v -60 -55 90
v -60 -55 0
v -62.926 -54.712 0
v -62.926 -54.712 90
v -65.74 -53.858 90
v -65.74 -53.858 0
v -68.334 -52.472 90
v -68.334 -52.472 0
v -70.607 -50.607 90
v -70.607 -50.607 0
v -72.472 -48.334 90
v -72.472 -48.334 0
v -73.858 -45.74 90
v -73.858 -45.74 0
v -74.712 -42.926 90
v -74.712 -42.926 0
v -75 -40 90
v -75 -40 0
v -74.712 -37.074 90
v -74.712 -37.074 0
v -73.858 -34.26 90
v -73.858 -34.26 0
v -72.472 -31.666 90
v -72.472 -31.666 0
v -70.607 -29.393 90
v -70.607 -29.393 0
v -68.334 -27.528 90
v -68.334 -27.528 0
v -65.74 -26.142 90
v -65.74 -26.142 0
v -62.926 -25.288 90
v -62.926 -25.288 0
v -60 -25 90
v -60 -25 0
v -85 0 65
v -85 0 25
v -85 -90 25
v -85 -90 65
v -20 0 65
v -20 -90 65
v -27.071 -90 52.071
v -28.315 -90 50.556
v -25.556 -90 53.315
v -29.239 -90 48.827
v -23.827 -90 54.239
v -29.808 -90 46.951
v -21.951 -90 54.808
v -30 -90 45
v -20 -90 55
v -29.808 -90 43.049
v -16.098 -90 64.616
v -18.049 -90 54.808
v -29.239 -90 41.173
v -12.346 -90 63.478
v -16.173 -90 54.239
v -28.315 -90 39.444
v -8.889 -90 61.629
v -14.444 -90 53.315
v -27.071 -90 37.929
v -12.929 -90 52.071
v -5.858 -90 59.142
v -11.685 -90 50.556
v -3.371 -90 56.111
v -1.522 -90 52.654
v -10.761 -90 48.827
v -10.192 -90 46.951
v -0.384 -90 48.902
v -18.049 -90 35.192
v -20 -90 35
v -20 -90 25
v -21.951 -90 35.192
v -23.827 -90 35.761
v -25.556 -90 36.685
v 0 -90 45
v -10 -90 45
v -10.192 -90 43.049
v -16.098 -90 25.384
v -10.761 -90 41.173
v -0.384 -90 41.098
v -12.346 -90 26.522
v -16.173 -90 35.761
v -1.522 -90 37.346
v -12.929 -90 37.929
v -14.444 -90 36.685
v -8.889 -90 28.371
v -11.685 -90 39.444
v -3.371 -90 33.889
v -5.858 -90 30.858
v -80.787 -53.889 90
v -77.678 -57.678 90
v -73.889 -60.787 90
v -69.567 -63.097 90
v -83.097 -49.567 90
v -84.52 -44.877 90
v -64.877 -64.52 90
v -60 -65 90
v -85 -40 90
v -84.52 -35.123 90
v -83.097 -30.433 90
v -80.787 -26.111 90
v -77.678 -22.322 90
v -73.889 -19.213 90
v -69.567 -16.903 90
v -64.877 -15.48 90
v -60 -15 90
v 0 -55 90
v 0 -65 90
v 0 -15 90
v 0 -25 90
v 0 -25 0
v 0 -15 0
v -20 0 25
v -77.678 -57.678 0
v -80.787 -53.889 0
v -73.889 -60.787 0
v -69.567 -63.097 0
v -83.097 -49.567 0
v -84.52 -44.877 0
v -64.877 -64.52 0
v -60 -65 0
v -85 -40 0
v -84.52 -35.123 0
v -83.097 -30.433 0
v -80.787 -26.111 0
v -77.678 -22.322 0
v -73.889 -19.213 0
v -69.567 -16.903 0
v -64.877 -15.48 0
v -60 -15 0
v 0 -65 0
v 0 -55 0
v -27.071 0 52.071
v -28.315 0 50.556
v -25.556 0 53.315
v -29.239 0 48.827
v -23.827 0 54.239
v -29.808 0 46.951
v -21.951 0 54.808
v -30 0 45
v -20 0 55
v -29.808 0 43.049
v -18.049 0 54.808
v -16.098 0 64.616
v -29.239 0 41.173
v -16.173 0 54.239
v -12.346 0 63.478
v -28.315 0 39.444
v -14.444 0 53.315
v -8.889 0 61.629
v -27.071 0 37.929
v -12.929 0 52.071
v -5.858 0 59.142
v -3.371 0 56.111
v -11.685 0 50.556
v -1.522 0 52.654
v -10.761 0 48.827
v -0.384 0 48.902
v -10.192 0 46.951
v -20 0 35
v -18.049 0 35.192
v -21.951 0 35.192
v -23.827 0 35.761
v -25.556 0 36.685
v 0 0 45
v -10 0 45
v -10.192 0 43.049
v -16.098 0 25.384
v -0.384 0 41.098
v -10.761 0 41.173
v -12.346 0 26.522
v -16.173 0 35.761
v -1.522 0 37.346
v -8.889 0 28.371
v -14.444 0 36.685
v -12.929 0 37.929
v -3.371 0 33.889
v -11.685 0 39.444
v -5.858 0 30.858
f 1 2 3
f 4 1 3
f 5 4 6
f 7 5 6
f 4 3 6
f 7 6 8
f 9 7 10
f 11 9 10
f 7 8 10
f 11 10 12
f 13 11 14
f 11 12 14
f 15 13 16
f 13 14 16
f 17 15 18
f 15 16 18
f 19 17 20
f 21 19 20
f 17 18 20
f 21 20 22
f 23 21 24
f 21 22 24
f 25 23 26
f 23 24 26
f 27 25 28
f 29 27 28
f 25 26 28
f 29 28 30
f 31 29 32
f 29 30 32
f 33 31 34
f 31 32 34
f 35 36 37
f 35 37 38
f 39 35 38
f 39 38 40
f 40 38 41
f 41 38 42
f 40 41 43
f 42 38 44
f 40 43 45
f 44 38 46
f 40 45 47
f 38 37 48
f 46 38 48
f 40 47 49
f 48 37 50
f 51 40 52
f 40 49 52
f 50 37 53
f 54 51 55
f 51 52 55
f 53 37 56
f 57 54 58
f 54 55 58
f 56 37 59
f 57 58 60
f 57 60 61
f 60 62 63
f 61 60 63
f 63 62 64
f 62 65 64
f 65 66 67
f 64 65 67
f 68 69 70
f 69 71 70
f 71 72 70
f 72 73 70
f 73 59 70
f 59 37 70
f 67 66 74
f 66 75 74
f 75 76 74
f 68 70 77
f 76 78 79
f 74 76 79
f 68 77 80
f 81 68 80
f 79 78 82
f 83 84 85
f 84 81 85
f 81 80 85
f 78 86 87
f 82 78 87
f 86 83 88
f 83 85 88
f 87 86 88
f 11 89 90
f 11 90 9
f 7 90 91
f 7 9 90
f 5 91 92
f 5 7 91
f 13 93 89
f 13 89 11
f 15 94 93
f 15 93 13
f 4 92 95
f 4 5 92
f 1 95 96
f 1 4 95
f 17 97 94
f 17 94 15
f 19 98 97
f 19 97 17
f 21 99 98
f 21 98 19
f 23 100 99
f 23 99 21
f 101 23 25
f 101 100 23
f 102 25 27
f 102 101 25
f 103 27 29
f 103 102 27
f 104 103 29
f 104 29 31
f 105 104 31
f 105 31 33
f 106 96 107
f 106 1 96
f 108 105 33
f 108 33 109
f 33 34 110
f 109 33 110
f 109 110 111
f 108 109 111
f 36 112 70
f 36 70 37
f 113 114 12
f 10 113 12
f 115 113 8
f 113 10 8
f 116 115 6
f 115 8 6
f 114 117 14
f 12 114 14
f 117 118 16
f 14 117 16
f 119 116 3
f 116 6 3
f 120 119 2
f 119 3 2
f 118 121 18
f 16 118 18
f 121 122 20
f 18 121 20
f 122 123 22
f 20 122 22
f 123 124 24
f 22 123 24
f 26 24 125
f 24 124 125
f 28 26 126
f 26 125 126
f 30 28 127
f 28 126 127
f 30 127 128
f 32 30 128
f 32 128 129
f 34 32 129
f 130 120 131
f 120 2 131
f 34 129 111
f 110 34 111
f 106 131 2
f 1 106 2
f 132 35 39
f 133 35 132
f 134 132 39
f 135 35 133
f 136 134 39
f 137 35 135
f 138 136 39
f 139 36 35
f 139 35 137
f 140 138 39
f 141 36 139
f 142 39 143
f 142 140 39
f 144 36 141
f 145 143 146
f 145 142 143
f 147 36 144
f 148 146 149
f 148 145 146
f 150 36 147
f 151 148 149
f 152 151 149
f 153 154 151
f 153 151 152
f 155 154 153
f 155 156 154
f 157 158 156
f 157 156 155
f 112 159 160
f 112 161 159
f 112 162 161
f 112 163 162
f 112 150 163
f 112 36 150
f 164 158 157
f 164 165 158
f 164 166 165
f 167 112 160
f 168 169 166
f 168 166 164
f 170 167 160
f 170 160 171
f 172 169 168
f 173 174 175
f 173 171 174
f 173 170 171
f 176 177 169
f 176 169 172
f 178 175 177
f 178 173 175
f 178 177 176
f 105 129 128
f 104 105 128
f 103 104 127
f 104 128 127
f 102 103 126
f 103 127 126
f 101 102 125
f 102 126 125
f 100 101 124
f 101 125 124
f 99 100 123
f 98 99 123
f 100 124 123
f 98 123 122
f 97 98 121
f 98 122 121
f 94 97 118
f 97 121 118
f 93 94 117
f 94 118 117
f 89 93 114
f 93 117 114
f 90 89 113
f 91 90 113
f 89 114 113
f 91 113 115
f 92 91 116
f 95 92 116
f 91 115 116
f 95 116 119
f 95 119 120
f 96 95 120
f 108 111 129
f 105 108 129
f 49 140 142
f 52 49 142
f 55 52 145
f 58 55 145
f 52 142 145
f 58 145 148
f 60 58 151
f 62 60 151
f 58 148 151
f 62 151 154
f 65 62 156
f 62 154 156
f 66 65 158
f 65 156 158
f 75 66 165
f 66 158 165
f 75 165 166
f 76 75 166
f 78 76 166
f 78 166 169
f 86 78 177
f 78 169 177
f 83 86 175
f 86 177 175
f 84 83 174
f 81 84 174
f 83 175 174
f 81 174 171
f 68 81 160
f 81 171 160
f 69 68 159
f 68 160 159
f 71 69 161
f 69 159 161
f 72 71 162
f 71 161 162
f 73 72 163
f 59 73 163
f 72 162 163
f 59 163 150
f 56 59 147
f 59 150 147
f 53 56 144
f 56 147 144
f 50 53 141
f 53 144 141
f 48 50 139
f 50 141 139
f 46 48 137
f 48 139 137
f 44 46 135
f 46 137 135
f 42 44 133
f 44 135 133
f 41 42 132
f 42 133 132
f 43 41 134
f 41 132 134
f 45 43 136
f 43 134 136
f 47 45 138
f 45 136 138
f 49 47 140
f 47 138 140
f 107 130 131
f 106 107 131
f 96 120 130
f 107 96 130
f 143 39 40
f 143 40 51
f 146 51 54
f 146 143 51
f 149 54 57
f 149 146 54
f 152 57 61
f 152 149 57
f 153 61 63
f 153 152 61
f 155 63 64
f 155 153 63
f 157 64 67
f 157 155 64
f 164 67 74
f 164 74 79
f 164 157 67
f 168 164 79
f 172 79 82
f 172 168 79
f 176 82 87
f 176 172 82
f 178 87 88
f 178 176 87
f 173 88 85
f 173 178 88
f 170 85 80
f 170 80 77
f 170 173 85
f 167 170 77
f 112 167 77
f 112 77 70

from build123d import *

# Parameters (mm, degrees)
EXTRUDE_THIN1_DEPTH = 90
SKETCH2_R           = 10
BOSS_EXTRUDE1_DEPTH = 90


with BuildPart() as part:
    # Sketch1 → Extrude-Thin1 (new body)
    with BuildSketch(Plane.XY):
        with BuildLine():
            Line((0, -15), (-60, -15))
            ThreePointArc((-60, -15), (-85, -40), (-60, -65))
            Line((-60, -65), (0, -65))
            Line((0, -65), (0, -55))
            Line((0, -55), (-60, -55))
            ThreePointArc((-60, -55), (-75, -40), (-60, -25))
            Line((-60, -25), (0, -25))
            Line((0, -25), (0, -15))
        make_face()
    extrude(amount=EXTRUDE_THIN1_DEPTH)


with BuildPart() as body_2:
    # Sketch2 → Boss-Extrude1 (new body)
    with BuildSketch(Plane(origin=(0, 0, 0), x_dir=(1, 0, 0), z_dir=(0, 1, 0))):
        with BuildLine():
            Line((-85, -25), (-85, -65))
            Line((-85, -65), (-20, -65))
            ThreePointArc((-20, -65), (0, -45), (-20, -25))
            Line((-20, -25), (-85, -25))
        make_face()
        with Locations(Location((-20, -45, 0), (0, 0, 270))):
            Circle(SKETCH2_R, mode=Mode.SUBTRACT)
    extrude(amount=-BOSS_EXTRUDE1_DEPTH)


solid = Compound([part.part, body_2.part])
